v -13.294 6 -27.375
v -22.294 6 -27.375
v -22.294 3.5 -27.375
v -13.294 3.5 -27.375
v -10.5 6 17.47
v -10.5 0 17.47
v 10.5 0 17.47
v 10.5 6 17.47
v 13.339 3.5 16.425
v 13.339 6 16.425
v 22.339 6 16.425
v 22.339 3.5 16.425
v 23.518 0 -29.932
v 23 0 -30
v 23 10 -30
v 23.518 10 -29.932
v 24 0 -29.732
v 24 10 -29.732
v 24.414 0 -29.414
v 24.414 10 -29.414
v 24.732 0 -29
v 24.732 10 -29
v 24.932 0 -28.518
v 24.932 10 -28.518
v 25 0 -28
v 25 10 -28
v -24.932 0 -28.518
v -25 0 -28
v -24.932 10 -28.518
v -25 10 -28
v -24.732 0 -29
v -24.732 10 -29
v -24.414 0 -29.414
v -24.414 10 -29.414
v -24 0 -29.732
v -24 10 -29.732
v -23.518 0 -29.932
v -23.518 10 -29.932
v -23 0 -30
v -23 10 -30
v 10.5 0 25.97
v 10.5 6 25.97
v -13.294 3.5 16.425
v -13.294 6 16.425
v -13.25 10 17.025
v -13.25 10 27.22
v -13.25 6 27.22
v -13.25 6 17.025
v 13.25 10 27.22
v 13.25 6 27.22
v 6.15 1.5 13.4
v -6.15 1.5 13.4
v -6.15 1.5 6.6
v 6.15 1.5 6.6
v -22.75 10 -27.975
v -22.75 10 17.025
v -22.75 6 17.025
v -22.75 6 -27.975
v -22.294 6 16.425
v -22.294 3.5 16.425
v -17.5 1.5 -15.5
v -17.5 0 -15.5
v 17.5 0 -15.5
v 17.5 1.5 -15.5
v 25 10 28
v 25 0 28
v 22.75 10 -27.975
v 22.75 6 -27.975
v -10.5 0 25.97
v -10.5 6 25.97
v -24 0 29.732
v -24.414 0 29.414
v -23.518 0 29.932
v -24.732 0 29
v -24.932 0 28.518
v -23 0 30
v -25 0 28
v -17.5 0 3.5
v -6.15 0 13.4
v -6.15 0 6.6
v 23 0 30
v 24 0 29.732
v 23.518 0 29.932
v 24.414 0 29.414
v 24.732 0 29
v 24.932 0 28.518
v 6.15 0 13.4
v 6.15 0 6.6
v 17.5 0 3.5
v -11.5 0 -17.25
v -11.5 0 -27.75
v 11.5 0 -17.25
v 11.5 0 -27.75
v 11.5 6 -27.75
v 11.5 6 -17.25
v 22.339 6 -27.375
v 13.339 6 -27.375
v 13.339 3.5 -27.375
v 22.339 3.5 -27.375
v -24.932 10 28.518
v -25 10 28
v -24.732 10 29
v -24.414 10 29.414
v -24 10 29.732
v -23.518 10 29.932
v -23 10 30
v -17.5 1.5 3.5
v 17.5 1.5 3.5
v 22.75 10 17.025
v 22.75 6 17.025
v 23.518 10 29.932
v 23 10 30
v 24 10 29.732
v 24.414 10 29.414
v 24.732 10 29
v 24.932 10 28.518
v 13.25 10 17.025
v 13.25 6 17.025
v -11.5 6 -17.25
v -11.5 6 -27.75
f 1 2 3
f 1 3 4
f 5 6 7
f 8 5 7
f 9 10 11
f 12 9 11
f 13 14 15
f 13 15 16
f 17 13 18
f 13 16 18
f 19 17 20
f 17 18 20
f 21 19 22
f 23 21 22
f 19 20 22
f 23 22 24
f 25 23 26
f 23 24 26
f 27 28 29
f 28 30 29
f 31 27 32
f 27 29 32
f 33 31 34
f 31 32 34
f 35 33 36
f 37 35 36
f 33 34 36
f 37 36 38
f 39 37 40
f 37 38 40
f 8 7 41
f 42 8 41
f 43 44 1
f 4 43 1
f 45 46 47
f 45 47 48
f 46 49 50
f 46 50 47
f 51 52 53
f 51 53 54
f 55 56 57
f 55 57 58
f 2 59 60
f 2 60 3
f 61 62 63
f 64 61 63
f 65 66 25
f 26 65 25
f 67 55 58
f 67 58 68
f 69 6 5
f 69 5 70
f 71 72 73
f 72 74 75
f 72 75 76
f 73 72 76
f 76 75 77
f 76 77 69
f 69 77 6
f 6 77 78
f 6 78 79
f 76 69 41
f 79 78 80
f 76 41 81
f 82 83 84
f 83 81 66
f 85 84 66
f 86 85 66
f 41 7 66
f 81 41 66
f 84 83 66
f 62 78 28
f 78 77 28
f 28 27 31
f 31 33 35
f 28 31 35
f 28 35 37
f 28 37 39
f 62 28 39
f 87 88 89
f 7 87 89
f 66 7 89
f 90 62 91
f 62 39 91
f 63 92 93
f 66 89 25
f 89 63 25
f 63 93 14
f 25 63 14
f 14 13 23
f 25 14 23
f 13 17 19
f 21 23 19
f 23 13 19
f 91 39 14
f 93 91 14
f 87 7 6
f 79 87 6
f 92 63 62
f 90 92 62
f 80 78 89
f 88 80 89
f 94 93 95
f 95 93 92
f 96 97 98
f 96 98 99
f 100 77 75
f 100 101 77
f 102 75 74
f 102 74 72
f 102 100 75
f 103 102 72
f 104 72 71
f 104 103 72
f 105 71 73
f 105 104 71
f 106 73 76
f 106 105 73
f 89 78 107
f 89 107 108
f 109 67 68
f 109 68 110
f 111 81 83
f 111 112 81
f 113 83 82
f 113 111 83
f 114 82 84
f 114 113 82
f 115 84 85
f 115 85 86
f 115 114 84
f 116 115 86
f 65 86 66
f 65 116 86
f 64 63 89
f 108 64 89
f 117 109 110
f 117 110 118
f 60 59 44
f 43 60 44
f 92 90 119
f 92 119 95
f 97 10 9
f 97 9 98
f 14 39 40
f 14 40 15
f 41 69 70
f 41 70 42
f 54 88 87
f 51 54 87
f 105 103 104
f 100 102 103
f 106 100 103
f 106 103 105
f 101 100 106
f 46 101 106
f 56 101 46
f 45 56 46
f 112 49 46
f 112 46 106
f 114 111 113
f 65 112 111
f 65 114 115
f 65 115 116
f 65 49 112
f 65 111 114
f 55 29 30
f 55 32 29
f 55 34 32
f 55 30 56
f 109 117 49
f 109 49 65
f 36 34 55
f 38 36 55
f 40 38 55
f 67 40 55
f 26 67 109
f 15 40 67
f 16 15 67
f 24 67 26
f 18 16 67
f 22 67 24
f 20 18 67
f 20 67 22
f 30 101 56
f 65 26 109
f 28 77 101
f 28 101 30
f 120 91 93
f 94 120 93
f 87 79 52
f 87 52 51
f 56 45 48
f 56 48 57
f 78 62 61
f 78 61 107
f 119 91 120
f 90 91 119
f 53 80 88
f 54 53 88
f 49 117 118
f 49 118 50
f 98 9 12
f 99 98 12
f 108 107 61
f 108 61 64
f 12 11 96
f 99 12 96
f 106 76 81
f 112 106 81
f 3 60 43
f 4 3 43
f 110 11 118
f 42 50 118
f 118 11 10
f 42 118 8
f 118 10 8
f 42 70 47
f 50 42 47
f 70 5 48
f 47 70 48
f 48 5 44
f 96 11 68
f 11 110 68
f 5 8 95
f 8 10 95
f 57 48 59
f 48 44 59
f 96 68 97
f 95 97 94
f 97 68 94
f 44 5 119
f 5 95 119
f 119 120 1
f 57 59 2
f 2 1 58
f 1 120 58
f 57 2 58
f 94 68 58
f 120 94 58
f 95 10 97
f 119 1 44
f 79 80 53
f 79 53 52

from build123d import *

# Parameters (mm, degrees)
SKETCH1_W           = 50
SKETCH1_H           = 60
BOSS_EXTRUDE1_DEPTH = 10
CUT_EXTRUDE1_DEPTH  = 4
SKETCH3_W           = 23
SKETCH3_H           = 10.5
SKETCH3_W_2         = 21
SKETCH3_H_2         = 8.5
CUT_EXTRUDE2_DEPTH  = 10
SKETCH4_W           = 9
SKETCH4_H           = 43.8
CUT_EXTRUDE3_DEPTH  = 2.5
SKETCH5_W           = 35
SKETCH5_H           = 19
CUT_EXTRUDE4_DEPTH  = 1.5
SKETCH6_W           = 12.3
SKETCH6_H           = 6.8
CUT_EXTRUDE5_DEPTH  = 1.5
FILLET1_R           = 2


with BuildPart() as part:
    # Sketch1 → Boss-Extrude1 (new body)
    with BuildSketch(Plane(origin=(0, 0, 0), x_dir=(1, 0, 0), z_dir=(0, 1, 0))):
        Rectangle(SKETCH1_W, SKETCH1_H)
    extrude(amount=BOSS_EXTRUDE1_DEPTH)

    # Sketch2 → Cut-Extrude1 (cut)
    with BuildSketch(Plane(origin=(0, 10, 0), x_dir=(1, 0, 0), z_dir=(0, 1, 0))):
        Polygon((-22.75, 27.975), (22.75, 27.975), (22.75, -17.025), (13.25, -17.025), (13.25, -27.22), (-13.25, -27.22), (-13.25, -17.025), (-22.75, -17.025), align=None)
    extrude(amount=-CUT_EXTRUDE1_DEPTH, mode=Mode.SUBTRACT)

    # Sketch3 → Cut-Extrude2 (cut)
    with BuildSketch(Plane.XZ):
        with Locations((0, -22.5)):
            Rectangle(SKETCH3_W, SKETCH3_H)
        with Locations((0, 21.72)):
            Rectangle(SKETCH3_W_2, SKETCH3_H_2)
    extrude(amount=-CUT_EXTRUDE2_DEPTH, mode=Mode.SUBTRACT)

    # Sketch4 → Cut-Extrude3 (cut)
    with BuildSketch(Plane(origin=(0, 6, 0), x_dir=(1, 0, 0), z_dir=(0, 1, 0))):
        with Locations((-17.793551609, 5.475)):
            Rectangle(SKETCH4_W, SKETCH4_H)
        with Locations((17.838749051, 5.475)):
            Rectangle(SKETCH4_W, SKETCH4_H)
    extrude(amount=-CUT_EXTRUDE3_DEPTH, mode=Mode.SUBTRACT)

    # Sketch5 → Cut-Extrude4 (cut)
    with BuildSketch(Plane.XZ):
        with Locations((0, -6)):
            Rectangle(SKETCH5_W, SKETCH5_H)
    extrude(amount=-CUT_EXTRUDE4_DEPTH, mode=Mode.SUBTRACT)

    # Sketch6 → Cut-Extrude5 (cut)
    with BuildSketch(Plane.XZ):
        with Locations((0, 10)):
            Rectangle(SKETCH6_W, SKETCH6_H)
    extrude(amount=-CUT_EXTRUDE5_DEPTH, mode=Mode.SUBTRACT)

    # Fillet1
    fillet1_edges = [part.edges().sort_by_distance(p)[0] for p in [
        (25, 5, 30),
        (-25, 5, 30),
        (-25, 5, -30),
        (25, 5, -30),
    ]]
    fillet(fillet1_edges, radius=FILLET1_R)


solid = part.part
